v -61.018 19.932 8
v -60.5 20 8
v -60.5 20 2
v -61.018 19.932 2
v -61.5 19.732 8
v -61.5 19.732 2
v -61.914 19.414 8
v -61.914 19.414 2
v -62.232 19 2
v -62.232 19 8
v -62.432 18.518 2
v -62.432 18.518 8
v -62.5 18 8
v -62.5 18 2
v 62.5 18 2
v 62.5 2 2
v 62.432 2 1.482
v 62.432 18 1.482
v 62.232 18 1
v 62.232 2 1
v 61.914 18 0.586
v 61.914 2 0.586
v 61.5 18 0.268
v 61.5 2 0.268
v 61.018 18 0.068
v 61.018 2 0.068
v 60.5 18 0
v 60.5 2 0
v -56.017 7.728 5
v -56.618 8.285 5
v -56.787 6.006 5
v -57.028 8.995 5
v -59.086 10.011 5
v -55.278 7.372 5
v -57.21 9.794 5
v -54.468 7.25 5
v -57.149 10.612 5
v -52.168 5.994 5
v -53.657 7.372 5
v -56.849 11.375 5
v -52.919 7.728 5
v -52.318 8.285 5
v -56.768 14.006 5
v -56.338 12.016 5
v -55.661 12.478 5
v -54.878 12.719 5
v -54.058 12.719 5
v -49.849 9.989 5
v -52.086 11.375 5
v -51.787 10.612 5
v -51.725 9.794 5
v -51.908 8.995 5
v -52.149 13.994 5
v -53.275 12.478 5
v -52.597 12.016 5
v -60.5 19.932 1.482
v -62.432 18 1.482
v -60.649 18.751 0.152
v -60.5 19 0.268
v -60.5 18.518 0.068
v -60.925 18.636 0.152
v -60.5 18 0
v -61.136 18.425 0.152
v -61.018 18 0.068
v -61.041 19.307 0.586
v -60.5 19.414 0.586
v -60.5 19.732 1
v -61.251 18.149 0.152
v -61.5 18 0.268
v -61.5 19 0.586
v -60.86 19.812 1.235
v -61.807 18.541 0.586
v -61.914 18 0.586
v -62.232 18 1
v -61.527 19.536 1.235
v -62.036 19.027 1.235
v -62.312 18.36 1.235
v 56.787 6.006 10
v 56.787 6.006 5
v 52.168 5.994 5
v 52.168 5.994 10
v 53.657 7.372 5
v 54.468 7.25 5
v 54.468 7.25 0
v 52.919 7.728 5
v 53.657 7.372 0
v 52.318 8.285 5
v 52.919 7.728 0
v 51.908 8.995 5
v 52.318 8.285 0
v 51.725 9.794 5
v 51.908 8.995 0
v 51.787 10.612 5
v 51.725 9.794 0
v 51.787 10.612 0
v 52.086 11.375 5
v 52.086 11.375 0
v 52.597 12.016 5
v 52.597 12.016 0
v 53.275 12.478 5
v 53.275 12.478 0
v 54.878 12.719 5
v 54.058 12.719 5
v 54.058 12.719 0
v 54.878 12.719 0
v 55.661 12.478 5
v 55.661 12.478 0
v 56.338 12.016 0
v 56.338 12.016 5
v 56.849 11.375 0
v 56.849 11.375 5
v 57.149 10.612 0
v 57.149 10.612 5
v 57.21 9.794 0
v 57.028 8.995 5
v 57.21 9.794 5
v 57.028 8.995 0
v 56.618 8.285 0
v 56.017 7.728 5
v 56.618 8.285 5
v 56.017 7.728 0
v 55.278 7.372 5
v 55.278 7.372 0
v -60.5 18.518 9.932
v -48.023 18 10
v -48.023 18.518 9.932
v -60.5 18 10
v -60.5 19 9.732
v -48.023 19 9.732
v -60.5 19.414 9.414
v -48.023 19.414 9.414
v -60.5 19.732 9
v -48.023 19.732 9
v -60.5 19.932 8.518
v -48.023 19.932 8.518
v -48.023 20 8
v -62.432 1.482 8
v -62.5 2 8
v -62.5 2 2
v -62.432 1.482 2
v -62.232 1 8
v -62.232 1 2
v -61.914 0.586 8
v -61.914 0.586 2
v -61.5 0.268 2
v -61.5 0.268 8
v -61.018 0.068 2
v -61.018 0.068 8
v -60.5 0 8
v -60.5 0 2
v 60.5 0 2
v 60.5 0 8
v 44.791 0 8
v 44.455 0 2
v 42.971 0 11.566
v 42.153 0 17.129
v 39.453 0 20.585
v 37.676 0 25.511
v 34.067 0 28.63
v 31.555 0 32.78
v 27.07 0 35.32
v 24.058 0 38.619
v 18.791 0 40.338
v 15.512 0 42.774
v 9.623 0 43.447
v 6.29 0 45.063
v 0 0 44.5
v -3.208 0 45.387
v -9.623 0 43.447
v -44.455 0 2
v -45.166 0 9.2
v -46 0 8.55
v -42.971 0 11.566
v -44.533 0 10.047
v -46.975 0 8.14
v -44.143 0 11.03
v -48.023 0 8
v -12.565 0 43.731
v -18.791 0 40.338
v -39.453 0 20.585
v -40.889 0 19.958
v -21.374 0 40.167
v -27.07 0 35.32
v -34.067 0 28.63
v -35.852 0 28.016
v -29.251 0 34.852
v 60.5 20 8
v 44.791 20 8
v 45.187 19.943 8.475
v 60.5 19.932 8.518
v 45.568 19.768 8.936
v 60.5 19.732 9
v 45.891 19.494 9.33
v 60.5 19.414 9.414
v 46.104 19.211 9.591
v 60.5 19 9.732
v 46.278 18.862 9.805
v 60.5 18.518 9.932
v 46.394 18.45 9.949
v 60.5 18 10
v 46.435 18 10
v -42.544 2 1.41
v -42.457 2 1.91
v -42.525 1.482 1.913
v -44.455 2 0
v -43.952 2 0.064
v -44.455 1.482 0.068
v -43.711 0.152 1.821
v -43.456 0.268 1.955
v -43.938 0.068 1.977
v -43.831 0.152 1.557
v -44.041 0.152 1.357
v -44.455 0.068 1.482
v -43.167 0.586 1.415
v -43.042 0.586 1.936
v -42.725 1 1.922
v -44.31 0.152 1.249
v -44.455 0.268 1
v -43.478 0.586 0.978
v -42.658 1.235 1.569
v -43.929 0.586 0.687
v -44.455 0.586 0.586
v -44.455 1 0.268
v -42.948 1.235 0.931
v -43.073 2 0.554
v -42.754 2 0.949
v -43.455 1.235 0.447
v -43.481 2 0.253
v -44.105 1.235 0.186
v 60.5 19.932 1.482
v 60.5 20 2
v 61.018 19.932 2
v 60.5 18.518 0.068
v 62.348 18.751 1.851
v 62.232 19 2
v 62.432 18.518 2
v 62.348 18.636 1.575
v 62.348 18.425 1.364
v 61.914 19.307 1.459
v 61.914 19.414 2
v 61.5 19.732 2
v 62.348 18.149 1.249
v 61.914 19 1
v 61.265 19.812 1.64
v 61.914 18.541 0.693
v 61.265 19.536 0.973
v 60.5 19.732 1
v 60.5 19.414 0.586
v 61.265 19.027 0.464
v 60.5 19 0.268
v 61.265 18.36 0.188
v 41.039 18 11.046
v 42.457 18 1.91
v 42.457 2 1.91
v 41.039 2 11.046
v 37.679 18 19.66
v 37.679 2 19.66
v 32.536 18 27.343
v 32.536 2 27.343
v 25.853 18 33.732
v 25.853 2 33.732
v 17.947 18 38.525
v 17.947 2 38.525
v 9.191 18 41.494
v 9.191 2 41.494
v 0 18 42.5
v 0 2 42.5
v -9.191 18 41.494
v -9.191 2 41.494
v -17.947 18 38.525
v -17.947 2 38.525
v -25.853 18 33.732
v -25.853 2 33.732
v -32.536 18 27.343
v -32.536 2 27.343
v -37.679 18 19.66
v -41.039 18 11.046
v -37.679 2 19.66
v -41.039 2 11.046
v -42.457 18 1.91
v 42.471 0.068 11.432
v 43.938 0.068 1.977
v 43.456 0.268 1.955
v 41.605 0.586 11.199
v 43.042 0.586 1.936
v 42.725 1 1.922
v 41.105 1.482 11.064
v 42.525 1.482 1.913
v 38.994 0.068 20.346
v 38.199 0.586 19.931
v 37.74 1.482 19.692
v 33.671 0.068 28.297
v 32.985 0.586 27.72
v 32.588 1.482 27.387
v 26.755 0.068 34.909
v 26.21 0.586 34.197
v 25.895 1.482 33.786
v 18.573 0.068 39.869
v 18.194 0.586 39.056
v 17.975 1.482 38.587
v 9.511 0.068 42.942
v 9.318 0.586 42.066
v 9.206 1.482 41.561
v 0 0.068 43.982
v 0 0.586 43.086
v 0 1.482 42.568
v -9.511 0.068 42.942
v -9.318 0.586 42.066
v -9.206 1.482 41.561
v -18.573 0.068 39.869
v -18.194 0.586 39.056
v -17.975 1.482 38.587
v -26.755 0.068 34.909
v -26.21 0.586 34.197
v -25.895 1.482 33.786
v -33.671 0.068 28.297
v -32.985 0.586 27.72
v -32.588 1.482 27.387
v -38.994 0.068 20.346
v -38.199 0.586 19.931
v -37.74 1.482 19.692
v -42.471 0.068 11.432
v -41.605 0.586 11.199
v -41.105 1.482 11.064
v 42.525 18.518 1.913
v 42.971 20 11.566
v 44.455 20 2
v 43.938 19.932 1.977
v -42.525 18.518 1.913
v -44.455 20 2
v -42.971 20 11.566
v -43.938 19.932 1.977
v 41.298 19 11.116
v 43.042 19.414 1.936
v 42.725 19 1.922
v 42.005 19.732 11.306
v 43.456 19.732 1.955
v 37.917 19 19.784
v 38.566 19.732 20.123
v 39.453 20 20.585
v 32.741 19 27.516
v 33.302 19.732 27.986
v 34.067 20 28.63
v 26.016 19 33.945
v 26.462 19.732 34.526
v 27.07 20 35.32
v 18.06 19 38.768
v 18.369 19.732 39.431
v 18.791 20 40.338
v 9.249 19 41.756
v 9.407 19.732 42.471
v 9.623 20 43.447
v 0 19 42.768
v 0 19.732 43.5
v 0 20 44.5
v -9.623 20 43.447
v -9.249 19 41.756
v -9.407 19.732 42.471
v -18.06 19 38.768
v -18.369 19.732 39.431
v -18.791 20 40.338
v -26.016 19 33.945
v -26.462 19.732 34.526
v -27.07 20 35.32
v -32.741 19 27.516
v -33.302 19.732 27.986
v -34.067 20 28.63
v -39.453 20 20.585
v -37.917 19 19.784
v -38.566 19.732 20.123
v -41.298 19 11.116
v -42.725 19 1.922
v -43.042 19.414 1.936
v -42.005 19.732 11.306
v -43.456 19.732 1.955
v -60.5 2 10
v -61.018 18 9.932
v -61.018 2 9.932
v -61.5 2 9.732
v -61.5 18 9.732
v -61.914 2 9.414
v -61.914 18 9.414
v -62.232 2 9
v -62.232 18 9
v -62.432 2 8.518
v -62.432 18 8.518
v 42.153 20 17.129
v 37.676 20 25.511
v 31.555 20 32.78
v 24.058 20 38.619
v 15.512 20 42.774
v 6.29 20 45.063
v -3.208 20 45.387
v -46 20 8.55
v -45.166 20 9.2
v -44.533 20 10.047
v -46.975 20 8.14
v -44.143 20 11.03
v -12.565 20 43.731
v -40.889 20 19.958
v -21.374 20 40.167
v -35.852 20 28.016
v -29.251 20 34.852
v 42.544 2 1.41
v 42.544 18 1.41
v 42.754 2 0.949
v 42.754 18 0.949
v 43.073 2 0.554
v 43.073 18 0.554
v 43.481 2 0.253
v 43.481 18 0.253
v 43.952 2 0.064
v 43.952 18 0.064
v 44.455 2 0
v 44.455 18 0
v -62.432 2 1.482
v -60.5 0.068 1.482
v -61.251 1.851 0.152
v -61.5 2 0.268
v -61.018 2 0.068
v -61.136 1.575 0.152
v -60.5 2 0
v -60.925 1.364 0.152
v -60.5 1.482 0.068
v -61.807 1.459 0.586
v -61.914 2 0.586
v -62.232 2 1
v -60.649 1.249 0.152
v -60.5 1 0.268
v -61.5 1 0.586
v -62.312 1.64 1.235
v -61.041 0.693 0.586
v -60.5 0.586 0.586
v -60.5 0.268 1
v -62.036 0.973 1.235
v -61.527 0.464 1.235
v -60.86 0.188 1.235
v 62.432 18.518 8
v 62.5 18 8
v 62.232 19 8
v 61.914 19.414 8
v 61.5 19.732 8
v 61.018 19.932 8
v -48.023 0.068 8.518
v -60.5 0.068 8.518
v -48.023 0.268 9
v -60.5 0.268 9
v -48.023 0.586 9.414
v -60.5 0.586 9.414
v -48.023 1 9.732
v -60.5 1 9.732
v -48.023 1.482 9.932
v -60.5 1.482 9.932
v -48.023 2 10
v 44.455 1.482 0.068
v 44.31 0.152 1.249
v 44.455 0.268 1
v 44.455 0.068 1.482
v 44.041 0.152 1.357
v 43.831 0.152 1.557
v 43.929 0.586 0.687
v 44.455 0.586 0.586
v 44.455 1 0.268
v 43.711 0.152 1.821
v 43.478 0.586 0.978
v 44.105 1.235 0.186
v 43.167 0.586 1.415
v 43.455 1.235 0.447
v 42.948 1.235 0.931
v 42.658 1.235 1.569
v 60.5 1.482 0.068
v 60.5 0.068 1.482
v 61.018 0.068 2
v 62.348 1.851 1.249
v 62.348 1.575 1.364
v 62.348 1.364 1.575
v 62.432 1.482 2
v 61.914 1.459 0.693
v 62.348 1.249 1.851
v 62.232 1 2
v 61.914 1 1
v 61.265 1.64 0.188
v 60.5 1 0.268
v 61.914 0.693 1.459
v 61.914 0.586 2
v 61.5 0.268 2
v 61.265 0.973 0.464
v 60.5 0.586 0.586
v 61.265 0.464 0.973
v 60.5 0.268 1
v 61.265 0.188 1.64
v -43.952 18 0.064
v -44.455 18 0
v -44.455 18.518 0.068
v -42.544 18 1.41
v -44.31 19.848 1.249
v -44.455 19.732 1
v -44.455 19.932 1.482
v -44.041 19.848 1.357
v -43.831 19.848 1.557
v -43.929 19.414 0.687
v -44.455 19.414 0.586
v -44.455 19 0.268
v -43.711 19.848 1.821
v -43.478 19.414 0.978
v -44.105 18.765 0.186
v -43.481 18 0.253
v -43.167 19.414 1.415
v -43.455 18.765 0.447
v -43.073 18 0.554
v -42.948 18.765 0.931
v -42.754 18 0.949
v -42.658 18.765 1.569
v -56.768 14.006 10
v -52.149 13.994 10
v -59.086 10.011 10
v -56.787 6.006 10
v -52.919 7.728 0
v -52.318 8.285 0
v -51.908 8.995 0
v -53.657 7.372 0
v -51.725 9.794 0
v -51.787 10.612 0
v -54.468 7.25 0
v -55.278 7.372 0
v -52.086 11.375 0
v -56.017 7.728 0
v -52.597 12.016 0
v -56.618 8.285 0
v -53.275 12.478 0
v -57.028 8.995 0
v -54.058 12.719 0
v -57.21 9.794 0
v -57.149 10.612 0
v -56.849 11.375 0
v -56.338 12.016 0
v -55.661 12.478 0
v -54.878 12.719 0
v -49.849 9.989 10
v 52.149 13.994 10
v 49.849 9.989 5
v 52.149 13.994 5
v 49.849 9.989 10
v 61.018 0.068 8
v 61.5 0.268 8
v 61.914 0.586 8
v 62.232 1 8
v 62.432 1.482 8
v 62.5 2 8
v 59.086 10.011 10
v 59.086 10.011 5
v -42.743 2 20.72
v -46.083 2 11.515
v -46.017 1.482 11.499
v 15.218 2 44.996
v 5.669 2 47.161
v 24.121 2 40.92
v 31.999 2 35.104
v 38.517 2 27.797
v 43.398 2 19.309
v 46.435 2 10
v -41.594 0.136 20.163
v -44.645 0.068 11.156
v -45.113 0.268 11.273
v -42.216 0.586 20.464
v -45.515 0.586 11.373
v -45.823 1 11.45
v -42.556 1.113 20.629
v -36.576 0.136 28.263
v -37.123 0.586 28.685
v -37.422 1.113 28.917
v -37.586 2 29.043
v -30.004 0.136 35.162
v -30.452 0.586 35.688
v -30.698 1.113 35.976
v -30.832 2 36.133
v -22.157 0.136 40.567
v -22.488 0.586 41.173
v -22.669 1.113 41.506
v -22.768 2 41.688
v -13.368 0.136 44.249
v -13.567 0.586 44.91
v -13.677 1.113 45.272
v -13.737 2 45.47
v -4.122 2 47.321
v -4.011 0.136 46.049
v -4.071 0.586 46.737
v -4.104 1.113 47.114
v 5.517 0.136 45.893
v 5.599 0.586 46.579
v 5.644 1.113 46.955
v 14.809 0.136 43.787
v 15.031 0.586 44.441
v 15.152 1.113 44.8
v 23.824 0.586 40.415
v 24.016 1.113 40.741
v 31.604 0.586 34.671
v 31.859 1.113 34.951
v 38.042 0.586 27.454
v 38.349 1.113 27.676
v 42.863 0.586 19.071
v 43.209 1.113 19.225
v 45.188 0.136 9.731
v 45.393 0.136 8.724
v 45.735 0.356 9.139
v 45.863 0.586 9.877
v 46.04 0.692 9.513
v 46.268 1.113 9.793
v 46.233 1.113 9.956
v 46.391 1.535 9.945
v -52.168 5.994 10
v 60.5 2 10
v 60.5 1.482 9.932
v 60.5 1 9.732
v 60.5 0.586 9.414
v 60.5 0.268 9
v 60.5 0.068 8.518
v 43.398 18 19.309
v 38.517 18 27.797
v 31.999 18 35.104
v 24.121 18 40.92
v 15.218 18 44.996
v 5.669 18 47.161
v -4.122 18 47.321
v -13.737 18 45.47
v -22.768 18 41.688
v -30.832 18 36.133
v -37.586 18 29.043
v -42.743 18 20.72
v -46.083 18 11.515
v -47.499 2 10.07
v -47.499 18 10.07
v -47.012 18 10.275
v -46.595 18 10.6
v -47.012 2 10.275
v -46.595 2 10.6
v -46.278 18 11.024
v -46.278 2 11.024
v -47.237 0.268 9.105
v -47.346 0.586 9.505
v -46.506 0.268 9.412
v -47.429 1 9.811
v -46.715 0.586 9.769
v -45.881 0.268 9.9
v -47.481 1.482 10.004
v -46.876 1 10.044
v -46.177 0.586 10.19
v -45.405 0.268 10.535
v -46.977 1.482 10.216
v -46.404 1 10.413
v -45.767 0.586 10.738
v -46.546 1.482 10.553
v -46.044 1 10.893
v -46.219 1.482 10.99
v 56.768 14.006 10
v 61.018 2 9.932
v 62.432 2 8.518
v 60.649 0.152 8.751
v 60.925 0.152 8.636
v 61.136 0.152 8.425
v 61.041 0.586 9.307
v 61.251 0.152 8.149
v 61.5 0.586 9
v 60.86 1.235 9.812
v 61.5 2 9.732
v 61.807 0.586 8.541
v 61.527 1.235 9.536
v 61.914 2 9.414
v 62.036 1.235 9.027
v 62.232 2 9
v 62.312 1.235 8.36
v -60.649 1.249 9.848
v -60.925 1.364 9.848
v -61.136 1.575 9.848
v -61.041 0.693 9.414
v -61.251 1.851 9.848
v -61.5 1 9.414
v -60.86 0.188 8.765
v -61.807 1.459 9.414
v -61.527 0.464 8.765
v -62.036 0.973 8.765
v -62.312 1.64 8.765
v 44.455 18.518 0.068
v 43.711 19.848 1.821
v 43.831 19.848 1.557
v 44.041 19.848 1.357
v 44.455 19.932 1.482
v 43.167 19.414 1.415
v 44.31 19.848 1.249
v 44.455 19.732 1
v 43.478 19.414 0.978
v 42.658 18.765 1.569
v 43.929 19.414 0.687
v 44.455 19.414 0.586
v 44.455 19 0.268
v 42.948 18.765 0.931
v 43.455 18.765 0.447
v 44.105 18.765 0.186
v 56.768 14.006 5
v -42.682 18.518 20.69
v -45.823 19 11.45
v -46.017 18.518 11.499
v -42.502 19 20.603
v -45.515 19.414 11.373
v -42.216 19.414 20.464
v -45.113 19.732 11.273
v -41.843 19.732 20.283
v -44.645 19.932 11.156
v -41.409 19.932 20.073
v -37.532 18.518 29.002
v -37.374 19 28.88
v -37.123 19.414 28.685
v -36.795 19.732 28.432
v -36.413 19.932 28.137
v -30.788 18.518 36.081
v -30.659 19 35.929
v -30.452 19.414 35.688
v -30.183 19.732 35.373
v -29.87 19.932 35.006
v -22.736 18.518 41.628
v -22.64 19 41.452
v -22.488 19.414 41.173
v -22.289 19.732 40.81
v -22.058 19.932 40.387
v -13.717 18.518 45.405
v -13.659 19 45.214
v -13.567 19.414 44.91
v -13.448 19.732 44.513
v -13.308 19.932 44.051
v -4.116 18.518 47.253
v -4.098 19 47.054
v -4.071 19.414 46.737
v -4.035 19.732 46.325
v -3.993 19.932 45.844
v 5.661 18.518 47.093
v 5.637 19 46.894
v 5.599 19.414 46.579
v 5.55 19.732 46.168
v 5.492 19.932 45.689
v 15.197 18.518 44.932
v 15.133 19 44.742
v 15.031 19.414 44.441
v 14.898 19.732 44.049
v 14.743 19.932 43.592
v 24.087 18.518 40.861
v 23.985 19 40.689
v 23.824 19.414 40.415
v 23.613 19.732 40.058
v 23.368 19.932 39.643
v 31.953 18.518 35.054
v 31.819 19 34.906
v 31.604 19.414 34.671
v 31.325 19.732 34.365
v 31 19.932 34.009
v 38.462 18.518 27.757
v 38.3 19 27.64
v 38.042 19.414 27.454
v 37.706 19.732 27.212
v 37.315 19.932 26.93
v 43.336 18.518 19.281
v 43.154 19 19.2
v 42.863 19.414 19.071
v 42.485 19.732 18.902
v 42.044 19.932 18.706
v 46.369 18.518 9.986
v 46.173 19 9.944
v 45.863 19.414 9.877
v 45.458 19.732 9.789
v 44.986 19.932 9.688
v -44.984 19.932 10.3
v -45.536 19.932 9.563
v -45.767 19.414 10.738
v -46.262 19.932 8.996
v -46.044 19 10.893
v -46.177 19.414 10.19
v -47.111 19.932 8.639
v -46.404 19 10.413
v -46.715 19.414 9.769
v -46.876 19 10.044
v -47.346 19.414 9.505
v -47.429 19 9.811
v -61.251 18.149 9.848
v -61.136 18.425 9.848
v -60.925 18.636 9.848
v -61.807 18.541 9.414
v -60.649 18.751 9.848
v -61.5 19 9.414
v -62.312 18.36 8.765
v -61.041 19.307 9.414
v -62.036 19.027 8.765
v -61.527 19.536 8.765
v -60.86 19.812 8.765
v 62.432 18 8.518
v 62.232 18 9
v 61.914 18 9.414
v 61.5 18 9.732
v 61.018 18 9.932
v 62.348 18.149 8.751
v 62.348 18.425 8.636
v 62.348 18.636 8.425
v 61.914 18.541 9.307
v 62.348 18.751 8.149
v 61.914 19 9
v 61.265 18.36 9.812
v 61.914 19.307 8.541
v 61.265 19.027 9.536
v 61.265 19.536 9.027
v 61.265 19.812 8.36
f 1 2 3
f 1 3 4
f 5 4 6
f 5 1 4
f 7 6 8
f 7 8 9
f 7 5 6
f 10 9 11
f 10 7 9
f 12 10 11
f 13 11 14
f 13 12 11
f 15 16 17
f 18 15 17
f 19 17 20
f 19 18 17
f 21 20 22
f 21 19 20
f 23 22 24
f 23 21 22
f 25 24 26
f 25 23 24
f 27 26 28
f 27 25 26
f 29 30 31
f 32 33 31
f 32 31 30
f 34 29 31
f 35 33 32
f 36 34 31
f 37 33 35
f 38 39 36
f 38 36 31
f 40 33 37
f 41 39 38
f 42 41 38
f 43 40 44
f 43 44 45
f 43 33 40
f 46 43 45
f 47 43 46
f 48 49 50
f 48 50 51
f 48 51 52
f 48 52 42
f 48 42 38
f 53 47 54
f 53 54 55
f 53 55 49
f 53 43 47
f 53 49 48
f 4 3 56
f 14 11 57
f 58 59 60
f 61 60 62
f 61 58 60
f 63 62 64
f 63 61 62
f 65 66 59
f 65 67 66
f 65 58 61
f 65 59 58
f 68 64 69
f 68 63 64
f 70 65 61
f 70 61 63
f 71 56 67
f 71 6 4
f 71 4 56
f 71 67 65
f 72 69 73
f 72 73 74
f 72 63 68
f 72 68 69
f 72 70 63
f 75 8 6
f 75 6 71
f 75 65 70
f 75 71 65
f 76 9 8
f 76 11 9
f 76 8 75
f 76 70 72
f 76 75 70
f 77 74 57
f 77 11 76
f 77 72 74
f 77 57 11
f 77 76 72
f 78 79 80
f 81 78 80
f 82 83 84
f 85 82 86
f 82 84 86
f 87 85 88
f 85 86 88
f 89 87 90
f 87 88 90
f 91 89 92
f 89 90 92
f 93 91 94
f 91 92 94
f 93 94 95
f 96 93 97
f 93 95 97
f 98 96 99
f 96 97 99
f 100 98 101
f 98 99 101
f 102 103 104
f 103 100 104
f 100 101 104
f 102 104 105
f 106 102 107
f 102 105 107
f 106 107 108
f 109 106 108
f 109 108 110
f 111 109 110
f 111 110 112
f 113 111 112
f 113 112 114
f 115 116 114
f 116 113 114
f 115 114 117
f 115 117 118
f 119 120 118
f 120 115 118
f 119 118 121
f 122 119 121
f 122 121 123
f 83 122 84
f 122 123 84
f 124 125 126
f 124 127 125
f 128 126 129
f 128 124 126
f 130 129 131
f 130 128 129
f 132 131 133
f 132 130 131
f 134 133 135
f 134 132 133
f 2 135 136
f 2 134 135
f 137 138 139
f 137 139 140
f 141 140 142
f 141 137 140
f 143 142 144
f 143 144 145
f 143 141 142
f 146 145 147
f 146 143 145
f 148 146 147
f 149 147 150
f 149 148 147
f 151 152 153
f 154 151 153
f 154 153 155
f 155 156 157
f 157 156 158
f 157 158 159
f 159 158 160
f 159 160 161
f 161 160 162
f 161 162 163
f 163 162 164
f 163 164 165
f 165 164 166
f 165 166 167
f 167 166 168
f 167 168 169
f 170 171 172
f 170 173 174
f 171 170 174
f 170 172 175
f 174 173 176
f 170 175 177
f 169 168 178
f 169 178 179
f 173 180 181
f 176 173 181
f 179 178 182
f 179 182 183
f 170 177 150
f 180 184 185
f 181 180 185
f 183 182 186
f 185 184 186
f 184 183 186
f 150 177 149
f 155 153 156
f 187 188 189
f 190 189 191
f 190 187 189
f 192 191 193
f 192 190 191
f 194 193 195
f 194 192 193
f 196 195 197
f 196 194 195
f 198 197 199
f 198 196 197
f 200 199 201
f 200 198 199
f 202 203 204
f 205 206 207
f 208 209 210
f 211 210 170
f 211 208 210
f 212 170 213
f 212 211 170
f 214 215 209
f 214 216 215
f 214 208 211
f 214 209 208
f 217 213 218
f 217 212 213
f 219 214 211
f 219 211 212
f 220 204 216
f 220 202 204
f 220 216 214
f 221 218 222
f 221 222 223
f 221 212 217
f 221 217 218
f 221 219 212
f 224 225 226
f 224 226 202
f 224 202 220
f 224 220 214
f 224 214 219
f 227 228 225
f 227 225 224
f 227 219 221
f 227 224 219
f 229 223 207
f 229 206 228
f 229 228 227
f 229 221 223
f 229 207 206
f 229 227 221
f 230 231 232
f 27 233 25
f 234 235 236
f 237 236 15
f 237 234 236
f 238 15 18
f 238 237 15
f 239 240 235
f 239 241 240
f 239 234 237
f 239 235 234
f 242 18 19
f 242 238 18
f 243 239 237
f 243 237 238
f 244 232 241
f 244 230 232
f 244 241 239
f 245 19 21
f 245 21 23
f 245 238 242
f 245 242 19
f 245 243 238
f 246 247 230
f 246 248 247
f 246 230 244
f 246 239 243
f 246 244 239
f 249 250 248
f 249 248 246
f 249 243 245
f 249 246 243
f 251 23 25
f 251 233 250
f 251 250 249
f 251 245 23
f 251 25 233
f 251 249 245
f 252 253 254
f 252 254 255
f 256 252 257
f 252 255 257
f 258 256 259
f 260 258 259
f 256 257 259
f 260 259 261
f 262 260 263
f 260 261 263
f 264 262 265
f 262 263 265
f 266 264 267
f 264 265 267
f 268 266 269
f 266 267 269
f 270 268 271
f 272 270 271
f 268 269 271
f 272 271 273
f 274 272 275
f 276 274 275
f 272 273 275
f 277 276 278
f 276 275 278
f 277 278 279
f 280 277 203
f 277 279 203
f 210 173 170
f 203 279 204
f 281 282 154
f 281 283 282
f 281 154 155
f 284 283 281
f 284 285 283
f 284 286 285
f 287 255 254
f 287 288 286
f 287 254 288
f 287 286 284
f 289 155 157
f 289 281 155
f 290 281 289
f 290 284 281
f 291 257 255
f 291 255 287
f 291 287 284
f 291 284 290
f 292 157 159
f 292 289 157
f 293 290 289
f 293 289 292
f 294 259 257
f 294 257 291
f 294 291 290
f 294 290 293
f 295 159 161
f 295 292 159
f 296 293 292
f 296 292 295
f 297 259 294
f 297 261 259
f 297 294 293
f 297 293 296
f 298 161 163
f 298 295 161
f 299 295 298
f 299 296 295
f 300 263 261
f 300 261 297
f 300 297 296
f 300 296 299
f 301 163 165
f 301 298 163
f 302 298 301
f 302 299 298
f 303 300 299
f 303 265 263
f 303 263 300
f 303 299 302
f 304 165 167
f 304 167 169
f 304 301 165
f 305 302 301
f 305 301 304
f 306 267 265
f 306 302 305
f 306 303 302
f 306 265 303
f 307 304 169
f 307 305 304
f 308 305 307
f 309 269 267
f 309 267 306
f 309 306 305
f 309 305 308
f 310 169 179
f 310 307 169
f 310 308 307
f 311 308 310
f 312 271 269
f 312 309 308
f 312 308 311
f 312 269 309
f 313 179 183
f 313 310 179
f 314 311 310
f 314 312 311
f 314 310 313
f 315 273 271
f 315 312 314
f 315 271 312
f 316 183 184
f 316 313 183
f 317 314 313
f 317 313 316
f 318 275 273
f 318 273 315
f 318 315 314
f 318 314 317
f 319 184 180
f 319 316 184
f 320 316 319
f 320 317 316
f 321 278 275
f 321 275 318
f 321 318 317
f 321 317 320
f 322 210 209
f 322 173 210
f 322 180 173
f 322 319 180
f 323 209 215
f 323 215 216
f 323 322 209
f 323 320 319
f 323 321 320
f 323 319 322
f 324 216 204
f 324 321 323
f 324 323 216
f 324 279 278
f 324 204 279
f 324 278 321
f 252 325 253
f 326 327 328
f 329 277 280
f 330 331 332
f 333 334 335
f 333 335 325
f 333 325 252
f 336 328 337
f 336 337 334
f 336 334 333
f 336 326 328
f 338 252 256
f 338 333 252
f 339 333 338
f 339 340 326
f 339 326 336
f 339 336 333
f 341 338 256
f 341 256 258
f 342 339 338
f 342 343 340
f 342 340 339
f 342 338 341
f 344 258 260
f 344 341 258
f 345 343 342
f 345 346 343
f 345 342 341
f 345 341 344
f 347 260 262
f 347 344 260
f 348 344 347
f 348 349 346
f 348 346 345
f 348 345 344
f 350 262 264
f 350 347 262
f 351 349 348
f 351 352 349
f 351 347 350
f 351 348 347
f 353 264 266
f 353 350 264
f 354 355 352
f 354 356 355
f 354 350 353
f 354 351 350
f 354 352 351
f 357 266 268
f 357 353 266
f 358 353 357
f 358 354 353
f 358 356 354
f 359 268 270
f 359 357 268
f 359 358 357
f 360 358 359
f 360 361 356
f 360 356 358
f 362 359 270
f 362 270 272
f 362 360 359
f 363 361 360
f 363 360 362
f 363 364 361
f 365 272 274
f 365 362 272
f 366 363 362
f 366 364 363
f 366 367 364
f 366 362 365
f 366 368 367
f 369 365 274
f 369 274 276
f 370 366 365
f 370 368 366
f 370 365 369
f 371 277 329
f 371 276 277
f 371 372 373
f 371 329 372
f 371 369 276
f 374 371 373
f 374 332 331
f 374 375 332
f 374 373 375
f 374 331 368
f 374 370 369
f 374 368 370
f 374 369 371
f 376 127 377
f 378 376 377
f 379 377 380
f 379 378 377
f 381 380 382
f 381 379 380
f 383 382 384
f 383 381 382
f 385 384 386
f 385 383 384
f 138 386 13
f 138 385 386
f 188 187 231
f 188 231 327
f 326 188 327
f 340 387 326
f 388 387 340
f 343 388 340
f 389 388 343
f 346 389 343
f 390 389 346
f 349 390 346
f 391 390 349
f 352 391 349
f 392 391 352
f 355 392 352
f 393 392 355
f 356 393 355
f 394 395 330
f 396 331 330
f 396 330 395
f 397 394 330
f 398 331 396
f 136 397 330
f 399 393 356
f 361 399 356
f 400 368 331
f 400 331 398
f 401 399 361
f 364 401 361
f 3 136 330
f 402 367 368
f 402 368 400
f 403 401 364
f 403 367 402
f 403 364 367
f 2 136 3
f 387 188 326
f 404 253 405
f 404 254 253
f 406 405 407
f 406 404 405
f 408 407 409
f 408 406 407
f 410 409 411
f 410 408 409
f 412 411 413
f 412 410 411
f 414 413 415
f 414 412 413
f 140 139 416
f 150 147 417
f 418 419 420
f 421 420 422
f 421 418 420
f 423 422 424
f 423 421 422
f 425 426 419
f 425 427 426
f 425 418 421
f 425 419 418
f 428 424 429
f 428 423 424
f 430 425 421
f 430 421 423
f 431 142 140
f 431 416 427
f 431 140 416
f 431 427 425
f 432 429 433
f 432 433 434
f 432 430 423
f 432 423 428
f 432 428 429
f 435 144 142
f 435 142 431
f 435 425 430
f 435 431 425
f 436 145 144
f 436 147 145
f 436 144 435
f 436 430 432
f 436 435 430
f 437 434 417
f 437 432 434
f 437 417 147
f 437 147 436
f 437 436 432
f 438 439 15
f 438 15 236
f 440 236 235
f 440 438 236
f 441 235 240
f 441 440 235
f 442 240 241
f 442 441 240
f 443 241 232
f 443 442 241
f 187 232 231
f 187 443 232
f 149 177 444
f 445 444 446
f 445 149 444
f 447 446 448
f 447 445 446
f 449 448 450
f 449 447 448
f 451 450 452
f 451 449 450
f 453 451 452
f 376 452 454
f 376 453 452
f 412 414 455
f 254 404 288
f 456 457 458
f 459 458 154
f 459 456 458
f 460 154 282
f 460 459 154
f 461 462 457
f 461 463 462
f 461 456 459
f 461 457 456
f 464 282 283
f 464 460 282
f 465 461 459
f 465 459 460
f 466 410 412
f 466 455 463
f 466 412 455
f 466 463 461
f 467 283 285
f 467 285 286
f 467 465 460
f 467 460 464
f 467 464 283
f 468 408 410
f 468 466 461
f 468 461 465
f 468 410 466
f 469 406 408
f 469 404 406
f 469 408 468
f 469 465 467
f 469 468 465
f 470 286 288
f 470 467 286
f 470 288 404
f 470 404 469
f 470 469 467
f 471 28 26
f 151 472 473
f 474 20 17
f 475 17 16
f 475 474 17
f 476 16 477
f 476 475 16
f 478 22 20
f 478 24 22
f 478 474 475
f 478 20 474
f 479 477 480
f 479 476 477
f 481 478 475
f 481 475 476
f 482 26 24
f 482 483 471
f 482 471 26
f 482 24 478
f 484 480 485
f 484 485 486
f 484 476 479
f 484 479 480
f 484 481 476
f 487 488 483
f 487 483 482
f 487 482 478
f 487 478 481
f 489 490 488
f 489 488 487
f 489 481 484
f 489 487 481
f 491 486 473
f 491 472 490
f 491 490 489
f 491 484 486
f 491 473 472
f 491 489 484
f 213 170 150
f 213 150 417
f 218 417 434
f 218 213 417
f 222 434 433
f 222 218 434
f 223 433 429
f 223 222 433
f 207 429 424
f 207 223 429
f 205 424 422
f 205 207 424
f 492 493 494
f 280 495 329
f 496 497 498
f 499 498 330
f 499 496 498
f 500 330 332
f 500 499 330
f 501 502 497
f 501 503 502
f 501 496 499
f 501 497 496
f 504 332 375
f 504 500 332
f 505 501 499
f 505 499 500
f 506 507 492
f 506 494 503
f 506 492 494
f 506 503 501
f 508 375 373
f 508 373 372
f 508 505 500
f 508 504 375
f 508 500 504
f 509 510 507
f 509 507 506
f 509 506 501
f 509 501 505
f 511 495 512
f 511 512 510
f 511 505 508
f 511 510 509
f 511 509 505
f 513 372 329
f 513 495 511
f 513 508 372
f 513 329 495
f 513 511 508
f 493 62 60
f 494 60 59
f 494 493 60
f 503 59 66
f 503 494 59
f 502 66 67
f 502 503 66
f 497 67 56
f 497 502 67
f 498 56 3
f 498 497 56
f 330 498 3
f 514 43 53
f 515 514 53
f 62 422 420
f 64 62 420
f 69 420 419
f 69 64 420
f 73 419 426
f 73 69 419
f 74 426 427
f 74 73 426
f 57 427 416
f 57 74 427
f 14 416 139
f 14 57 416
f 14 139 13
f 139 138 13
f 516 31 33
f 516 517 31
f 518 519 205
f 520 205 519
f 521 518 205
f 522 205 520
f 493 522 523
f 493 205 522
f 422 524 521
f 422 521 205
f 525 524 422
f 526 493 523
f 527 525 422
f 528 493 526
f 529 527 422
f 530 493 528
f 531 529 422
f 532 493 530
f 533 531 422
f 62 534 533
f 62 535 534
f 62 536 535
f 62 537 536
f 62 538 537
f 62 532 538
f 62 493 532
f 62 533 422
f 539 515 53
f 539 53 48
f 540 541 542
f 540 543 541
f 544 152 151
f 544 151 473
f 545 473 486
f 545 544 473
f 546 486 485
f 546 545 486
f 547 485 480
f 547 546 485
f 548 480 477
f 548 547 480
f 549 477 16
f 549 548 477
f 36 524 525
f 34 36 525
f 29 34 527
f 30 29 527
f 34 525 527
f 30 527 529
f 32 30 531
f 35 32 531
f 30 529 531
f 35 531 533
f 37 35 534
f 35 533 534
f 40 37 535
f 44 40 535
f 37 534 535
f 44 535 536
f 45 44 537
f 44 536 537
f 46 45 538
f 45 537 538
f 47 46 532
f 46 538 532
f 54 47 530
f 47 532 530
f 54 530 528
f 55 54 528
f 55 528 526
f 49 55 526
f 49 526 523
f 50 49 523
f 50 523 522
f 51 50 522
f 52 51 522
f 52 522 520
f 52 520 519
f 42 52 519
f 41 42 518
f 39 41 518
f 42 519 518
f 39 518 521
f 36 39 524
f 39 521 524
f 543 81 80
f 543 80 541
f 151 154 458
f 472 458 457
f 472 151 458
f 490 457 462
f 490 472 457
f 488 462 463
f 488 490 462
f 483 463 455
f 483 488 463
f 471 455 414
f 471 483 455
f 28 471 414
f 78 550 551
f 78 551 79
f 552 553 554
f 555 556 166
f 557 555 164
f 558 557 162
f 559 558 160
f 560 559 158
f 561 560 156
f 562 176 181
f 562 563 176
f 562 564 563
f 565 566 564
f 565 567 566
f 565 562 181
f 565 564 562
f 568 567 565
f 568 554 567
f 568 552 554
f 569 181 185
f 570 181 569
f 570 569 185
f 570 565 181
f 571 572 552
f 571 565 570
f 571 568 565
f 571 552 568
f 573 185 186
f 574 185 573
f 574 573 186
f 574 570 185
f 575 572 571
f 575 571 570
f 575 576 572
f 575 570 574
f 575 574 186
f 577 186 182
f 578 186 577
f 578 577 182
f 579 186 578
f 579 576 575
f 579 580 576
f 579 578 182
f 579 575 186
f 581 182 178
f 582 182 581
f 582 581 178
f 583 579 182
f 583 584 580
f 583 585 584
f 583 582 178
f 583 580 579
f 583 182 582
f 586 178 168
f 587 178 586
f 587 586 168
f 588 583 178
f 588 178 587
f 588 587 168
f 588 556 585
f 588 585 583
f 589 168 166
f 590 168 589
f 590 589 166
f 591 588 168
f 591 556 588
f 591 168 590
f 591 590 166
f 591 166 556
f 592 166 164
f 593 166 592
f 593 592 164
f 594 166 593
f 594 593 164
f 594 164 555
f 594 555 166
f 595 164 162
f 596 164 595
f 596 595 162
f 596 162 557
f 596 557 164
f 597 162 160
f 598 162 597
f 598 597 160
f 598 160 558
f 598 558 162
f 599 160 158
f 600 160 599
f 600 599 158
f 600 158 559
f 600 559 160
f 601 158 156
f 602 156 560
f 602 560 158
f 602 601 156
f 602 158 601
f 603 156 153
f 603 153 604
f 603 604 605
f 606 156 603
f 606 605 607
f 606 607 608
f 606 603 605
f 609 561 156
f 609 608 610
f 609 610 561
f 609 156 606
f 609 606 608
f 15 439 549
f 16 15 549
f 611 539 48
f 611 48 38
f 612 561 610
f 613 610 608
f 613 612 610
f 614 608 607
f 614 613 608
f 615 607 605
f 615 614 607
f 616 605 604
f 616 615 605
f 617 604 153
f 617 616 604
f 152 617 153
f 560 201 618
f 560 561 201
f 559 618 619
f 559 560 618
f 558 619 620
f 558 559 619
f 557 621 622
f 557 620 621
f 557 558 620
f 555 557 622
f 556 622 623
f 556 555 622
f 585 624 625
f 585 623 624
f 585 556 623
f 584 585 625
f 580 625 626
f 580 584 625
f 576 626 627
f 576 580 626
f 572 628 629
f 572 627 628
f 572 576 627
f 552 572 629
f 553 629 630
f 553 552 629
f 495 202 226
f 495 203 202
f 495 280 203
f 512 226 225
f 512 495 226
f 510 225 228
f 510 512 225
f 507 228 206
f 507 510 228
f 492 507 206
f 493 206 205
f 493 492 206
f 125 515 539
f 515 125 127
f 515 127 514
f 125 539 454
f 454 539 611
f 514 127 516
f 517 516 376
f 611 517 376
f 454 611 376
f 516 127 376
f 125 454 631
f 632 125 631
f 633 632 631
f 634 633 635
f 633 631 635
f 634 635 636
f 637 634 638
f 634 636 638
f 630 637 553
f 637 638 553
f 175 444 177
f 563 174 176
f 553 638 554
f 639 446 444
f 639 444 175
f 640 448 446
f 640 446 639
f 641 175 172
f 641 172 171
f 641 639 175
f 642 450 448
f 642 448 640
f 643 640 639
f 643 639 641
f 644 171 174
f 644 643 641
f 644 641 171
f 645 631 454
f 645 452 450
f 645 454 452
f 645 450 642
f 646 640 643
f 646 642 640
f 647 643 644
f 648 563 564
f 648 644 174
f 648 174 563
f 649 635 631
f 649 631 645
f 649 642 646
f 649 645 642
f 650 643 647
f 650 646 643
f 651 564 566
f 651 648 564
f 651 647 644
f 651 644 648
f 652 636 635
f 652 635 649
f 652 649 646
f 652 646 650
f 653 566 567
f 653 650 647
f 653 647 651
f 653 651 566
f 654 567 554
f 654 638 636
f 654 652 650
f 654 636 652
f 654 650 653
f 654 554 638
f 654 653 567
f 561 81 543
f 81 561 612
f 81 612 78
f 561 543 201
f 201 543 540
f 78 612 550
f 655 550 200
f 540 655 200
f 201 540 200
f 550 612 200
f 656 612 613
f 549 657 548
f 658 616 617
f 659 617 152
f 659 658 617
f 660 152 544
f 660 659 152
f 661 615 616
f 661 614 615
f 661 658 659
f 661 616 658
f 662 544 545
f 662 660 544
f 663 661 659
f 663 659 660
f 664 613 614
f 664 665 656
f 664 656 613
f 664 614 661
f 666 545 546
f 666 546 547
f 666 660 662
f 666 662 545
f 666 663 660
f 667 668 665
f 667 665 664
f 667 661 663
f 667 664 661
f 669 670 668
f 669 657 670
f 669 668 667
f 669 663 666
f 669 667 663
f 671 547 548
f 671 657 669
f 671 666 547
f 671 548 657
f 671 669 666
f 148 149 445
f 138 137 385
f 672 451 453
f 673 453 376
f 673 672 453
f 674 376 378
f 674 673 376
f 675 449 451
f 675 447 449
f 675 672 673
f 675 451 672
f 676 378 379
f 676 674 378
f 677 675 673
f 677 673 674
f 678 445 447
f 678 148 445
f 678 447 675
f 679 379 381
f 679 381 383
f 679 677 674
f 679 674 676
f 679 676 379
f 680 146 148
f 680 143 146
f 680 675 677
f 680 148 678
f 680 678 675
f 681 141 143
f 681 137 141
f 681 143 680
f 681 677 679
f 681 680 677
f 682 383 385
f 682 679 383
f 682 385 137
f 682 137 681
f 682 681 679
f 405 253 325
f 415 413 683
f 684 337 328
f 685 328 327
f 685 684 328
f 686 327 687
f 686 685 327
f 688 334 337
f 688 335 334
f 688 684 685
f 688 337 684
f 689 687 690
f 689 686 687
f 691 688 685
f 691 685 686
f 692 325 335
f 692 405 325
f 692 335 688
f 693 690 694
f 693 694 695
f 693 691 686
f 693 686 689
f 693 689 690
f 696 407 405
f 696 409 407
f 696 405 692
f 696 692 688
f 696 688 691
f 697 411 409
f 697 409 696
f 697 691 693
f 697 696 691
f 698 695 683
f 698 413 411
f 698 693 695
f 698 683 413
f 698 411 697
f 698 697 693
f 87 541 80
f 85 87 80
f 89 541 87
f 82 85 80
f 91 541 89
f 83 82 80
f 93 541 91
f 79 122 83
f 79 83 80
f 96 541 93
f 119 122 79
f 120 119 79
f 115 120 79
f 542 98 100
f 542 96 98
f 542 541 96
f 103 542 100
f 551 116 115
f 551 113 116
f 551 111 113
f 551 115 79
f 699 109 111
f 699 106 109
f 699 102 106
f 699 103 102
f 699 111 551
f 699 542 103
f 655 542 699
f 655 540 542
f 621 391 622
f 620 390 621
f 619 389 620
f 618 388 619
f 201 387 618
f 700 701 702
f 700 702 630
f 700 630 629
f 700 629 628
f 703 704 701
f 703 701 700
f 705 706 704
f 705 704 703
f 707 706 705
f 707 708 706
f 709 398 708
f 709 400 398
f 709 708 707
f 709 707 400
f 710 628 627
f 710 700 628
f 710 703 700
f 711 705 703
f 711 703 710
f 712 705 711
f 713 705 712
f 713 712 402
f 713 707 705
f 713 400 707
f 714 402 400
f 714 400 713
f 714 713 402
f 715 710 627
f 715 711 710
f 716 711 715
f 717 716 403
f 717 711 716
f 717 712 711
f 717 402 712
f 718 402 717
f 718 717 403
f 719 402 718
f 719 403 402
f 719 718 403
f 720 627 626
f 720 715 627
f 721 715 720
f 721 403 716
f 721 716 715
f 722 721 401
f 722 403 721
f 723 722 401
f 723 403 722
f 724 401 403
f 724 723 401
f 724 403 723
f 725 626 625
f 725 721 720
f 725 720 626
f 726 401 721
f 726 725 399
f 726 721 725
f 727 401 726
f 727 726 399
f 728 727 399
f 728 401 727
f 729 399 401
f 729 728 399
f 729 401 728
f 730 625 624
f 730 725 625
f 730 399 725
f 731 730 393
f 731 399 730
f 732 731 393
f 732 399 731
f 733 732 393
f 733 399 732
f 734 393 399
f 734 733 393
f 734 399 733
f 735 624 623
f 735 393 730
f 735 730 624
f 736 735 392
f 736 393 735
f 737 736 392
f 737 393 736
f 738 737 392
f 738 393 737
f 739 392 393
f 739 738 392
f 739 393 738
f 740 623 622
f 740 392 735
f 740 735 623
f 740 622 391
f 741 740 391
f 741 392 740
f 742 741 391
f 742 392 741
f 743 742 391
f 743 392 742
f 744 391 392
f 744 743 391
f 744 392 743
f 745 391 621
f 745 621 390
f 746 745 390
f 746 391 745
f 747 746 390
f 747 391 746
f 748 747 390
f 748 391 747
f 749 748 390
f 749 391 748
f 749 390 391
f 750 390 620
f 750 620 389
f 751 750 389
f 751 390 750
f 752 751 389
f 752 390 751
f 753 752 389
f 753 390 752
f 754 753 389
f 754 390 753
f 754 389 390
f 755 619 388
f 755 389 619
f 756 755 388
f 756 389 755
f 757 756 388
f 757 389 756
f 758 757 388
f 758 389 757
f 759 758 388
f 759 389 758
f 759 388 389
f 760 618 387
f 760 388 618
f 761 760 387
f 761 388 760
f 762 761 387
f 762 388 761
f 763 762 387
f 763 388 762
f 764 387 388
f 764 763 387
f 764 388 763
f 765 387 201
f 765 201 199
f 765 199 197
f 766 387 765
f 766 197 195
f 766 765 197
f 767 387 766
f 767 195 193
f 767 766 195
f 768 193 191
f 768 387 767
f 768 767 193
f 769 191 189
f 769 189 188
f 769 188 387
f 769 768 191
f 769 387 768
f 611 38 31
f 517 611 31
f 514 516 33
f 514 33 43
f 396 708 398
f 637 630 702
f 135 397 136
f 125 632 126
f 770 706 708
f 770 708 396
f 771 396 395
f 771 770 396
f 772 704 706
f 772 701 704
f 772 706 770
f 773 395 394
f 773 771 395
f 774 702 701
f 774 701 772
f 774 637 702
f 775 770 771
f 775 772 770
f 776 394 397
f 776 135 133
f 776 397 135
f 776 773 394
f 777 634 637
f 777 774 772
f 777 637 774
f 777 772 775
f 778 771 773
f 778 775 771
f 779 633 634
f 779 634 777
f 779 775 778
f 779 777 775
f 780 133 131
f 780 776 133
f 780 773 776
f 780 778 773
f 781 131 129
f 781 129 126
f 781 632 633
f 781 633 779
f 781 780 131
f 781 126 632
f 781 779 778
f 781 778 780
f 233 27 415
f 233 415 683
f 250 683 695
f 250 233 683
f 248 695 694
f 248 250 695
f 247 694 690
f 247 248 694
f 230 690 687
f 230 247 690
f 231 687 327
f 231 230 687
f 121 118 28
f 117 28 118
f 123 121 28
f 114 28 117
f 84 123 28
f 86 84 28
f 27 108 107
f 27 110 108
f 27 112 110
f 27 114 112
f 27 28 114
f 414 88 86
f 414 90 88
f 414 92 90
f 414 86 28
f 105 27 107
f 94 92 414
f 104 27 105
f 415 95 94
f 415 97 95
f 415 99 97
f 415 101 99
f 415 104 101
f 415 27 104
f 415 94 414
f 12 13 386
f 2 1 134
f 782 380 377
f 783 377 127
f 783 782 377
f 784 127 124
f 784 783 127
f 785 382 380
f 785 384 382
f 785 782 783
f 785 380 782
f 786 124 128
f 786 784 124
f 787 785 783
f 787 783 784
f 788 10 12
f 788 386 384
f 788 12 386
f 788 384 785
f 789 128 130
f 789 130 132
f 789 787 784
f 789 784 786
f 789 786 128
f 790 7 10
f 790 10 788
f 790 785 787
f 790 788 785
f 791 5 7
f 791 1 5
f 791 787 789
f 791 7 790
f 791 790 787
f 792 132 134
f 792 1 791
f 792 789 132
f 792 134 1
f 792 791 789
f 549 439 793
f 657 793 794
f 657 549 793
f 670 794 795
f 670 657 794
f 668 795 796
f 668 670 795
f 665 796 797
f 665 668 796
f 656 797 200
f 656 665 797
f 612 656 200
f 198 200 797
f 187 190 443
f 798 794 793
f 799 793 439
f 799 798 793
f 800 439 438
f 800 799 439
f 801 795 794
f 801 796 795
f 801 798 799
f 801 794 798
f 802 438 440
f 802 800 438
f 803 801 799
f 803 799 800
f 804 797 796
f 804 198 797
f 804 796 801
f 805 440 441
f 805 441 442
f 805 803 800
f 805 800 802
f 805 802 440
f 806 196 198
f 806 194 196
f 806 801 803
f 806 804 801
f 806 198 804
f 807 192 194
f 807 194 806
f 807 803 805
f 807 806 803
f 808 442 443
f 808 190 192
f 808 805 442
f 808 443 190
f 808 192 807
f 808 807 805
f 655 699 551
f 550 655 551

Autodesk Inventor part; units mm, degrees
ref_plane "XZ Plane" through (0, 0, 0) normal (0, 1, 0) x (-1, 0, 0)
ref_plane "XY Plane" through (0, 0, 0) normal (0, 0, 1) x (1, 0, 0)
sketch "Sketch1" plane through (0, 0, 0) normal (0, 1, 0) x (-1, 0, 0)
  circle A0 centre (0, 0) radius 47.5
  dimension "d0" = 95
extrude "Extrusion1" add sketch "Sketch1" along normal blind 20
shell "Shell1" thickness 5 removed faces 2 at (-10.3648, 20, 5.7529) at (-10.3648, 0, 5.7529)
sketch "Sketch2" plane through (0, 20, 0) normal (0, 1, 0) x (1, 0, 0)
  line L0 (-62.0625, 51.3519) -> (57.6609, 51.3519)
  line L1 (57.6609, 51.3519) -> (57.6609, 0)
  line L2 (57.6609, 0) -> (-62.0625, 0)
  line L3 (-62.0625, 0) -> (-62.0625, 51.3519)
  point P0 (0, 0)
extrude "Extrusion2" cut sketch "Sketch2" against normal through all
ref_plane "Work Plane1" through (-47.5, 0, 0) normal (1, 0, 0) x (0, 1, 0)
sketch "Sketch3" plane through (-47.5, 0, 0) normal (1, 0, 0) x (0, 1, 0)
  line L0 (0, 0) -> (0, 47.5) projected
  line L1 (0, 0) -> (20, 0)
  line L2 (20, 0) -> (20, 10)
  line L3 (20, 10) -> (0, 10)
  line L4 (0, 10) -> (0, 0)
  point P0 (0, 10)
  dimension "d7" = 20
  dimension "d8" = 10
extrude "Extrusion3" add sketch "Sketch3" along normal blind 2 and the other way blind 15
mirror "Mirror1" about plane through (0, 0, 0) normal (1, 0, 0) of "Extrusion3"
sketch "Sketch6" plane through (-62.5, 20, 10) normal (0, 0, 1) x (1, 0, 0)
  line L0 (10.3322, -14.0055) -> (5.7134, -13.9945)
  line L1 (5.7134, -13.9945) -> (3.4135, -9.9891)
  line L2 (3.4135, -9.9891) -> (5.7324, -5.9945)
  line L3 (5.7324, -5.9945) -> (10.3512, -6.0055)
  line L4 (10.3512, -6.0055) -> (12.6511, -10.0109)
  line L5 (12.6511, -10.0109) -> (10.3322, -14.0055)
  line L6 (0, -20) -> (0, 0) projected
  line L7 (16.0646, 0) -> (0, 0) projected
  point P0 (62.5, -20)
  point P1 (8.0323, -10)
  point P2 (0, -10)
  point P3 (8.0323, 0)
  dimension "d27" = 8
extrude "Extrusion4" cut sketch "Sketch6" against normal blind 5
sketch "Sketch7" plane through (-62.5, 20, 5) normal (0, 0, 1) x (1, 0, 0)
  line L0 (0, -20) -> (0, 0) projected
  line L1 (16.0646, 0) -> (0, 0) projected
  point P0 (62.5, -20)
  point P1 (8.0323, -10)
  point P2 (0, -10)
  point P3 (8.0323, 0)
hole "Hole3" at (-54.4677, 10, 5) direction (0, 0, -1) diameter 5.5 end through all clearance for "Hex Head Bolt" size "M5" standard "Ansi Metric M Profile"
mirror "Mirror3" about plane through (0, 0, 0) normal (1, 0, 0) of "Extrusion4", "Hole3"
fillet "Fillet1" radius 2 23 edges at (-62.5, 0, 5) (-62.5, 20, 5) (-46.4354, 10, 10) (-54.4677, 0, 10) (-62.5, 10, 10) (-54.4677, 20, 10) (0, 20, 47.5) (0, 20, 42.5) (0, 0, 47.5) (-52.5, 20, 0) (52.5, 20, 0) (-62.5, 10, 0) (-52.5, 0, 0) (52.5, 0, 0) (0, 0, 42.5) (54.4677, 20, 10) (62.5, 10, 10) (54.4677, 0, 10) (62.5, 0, 5) (62.5, 20, 5) (62.5, 10, 0) (-42.5, 10, 0) (42.5, 10, 0)
properties part number "ur5e_cable_tube_bottom_85mm"
